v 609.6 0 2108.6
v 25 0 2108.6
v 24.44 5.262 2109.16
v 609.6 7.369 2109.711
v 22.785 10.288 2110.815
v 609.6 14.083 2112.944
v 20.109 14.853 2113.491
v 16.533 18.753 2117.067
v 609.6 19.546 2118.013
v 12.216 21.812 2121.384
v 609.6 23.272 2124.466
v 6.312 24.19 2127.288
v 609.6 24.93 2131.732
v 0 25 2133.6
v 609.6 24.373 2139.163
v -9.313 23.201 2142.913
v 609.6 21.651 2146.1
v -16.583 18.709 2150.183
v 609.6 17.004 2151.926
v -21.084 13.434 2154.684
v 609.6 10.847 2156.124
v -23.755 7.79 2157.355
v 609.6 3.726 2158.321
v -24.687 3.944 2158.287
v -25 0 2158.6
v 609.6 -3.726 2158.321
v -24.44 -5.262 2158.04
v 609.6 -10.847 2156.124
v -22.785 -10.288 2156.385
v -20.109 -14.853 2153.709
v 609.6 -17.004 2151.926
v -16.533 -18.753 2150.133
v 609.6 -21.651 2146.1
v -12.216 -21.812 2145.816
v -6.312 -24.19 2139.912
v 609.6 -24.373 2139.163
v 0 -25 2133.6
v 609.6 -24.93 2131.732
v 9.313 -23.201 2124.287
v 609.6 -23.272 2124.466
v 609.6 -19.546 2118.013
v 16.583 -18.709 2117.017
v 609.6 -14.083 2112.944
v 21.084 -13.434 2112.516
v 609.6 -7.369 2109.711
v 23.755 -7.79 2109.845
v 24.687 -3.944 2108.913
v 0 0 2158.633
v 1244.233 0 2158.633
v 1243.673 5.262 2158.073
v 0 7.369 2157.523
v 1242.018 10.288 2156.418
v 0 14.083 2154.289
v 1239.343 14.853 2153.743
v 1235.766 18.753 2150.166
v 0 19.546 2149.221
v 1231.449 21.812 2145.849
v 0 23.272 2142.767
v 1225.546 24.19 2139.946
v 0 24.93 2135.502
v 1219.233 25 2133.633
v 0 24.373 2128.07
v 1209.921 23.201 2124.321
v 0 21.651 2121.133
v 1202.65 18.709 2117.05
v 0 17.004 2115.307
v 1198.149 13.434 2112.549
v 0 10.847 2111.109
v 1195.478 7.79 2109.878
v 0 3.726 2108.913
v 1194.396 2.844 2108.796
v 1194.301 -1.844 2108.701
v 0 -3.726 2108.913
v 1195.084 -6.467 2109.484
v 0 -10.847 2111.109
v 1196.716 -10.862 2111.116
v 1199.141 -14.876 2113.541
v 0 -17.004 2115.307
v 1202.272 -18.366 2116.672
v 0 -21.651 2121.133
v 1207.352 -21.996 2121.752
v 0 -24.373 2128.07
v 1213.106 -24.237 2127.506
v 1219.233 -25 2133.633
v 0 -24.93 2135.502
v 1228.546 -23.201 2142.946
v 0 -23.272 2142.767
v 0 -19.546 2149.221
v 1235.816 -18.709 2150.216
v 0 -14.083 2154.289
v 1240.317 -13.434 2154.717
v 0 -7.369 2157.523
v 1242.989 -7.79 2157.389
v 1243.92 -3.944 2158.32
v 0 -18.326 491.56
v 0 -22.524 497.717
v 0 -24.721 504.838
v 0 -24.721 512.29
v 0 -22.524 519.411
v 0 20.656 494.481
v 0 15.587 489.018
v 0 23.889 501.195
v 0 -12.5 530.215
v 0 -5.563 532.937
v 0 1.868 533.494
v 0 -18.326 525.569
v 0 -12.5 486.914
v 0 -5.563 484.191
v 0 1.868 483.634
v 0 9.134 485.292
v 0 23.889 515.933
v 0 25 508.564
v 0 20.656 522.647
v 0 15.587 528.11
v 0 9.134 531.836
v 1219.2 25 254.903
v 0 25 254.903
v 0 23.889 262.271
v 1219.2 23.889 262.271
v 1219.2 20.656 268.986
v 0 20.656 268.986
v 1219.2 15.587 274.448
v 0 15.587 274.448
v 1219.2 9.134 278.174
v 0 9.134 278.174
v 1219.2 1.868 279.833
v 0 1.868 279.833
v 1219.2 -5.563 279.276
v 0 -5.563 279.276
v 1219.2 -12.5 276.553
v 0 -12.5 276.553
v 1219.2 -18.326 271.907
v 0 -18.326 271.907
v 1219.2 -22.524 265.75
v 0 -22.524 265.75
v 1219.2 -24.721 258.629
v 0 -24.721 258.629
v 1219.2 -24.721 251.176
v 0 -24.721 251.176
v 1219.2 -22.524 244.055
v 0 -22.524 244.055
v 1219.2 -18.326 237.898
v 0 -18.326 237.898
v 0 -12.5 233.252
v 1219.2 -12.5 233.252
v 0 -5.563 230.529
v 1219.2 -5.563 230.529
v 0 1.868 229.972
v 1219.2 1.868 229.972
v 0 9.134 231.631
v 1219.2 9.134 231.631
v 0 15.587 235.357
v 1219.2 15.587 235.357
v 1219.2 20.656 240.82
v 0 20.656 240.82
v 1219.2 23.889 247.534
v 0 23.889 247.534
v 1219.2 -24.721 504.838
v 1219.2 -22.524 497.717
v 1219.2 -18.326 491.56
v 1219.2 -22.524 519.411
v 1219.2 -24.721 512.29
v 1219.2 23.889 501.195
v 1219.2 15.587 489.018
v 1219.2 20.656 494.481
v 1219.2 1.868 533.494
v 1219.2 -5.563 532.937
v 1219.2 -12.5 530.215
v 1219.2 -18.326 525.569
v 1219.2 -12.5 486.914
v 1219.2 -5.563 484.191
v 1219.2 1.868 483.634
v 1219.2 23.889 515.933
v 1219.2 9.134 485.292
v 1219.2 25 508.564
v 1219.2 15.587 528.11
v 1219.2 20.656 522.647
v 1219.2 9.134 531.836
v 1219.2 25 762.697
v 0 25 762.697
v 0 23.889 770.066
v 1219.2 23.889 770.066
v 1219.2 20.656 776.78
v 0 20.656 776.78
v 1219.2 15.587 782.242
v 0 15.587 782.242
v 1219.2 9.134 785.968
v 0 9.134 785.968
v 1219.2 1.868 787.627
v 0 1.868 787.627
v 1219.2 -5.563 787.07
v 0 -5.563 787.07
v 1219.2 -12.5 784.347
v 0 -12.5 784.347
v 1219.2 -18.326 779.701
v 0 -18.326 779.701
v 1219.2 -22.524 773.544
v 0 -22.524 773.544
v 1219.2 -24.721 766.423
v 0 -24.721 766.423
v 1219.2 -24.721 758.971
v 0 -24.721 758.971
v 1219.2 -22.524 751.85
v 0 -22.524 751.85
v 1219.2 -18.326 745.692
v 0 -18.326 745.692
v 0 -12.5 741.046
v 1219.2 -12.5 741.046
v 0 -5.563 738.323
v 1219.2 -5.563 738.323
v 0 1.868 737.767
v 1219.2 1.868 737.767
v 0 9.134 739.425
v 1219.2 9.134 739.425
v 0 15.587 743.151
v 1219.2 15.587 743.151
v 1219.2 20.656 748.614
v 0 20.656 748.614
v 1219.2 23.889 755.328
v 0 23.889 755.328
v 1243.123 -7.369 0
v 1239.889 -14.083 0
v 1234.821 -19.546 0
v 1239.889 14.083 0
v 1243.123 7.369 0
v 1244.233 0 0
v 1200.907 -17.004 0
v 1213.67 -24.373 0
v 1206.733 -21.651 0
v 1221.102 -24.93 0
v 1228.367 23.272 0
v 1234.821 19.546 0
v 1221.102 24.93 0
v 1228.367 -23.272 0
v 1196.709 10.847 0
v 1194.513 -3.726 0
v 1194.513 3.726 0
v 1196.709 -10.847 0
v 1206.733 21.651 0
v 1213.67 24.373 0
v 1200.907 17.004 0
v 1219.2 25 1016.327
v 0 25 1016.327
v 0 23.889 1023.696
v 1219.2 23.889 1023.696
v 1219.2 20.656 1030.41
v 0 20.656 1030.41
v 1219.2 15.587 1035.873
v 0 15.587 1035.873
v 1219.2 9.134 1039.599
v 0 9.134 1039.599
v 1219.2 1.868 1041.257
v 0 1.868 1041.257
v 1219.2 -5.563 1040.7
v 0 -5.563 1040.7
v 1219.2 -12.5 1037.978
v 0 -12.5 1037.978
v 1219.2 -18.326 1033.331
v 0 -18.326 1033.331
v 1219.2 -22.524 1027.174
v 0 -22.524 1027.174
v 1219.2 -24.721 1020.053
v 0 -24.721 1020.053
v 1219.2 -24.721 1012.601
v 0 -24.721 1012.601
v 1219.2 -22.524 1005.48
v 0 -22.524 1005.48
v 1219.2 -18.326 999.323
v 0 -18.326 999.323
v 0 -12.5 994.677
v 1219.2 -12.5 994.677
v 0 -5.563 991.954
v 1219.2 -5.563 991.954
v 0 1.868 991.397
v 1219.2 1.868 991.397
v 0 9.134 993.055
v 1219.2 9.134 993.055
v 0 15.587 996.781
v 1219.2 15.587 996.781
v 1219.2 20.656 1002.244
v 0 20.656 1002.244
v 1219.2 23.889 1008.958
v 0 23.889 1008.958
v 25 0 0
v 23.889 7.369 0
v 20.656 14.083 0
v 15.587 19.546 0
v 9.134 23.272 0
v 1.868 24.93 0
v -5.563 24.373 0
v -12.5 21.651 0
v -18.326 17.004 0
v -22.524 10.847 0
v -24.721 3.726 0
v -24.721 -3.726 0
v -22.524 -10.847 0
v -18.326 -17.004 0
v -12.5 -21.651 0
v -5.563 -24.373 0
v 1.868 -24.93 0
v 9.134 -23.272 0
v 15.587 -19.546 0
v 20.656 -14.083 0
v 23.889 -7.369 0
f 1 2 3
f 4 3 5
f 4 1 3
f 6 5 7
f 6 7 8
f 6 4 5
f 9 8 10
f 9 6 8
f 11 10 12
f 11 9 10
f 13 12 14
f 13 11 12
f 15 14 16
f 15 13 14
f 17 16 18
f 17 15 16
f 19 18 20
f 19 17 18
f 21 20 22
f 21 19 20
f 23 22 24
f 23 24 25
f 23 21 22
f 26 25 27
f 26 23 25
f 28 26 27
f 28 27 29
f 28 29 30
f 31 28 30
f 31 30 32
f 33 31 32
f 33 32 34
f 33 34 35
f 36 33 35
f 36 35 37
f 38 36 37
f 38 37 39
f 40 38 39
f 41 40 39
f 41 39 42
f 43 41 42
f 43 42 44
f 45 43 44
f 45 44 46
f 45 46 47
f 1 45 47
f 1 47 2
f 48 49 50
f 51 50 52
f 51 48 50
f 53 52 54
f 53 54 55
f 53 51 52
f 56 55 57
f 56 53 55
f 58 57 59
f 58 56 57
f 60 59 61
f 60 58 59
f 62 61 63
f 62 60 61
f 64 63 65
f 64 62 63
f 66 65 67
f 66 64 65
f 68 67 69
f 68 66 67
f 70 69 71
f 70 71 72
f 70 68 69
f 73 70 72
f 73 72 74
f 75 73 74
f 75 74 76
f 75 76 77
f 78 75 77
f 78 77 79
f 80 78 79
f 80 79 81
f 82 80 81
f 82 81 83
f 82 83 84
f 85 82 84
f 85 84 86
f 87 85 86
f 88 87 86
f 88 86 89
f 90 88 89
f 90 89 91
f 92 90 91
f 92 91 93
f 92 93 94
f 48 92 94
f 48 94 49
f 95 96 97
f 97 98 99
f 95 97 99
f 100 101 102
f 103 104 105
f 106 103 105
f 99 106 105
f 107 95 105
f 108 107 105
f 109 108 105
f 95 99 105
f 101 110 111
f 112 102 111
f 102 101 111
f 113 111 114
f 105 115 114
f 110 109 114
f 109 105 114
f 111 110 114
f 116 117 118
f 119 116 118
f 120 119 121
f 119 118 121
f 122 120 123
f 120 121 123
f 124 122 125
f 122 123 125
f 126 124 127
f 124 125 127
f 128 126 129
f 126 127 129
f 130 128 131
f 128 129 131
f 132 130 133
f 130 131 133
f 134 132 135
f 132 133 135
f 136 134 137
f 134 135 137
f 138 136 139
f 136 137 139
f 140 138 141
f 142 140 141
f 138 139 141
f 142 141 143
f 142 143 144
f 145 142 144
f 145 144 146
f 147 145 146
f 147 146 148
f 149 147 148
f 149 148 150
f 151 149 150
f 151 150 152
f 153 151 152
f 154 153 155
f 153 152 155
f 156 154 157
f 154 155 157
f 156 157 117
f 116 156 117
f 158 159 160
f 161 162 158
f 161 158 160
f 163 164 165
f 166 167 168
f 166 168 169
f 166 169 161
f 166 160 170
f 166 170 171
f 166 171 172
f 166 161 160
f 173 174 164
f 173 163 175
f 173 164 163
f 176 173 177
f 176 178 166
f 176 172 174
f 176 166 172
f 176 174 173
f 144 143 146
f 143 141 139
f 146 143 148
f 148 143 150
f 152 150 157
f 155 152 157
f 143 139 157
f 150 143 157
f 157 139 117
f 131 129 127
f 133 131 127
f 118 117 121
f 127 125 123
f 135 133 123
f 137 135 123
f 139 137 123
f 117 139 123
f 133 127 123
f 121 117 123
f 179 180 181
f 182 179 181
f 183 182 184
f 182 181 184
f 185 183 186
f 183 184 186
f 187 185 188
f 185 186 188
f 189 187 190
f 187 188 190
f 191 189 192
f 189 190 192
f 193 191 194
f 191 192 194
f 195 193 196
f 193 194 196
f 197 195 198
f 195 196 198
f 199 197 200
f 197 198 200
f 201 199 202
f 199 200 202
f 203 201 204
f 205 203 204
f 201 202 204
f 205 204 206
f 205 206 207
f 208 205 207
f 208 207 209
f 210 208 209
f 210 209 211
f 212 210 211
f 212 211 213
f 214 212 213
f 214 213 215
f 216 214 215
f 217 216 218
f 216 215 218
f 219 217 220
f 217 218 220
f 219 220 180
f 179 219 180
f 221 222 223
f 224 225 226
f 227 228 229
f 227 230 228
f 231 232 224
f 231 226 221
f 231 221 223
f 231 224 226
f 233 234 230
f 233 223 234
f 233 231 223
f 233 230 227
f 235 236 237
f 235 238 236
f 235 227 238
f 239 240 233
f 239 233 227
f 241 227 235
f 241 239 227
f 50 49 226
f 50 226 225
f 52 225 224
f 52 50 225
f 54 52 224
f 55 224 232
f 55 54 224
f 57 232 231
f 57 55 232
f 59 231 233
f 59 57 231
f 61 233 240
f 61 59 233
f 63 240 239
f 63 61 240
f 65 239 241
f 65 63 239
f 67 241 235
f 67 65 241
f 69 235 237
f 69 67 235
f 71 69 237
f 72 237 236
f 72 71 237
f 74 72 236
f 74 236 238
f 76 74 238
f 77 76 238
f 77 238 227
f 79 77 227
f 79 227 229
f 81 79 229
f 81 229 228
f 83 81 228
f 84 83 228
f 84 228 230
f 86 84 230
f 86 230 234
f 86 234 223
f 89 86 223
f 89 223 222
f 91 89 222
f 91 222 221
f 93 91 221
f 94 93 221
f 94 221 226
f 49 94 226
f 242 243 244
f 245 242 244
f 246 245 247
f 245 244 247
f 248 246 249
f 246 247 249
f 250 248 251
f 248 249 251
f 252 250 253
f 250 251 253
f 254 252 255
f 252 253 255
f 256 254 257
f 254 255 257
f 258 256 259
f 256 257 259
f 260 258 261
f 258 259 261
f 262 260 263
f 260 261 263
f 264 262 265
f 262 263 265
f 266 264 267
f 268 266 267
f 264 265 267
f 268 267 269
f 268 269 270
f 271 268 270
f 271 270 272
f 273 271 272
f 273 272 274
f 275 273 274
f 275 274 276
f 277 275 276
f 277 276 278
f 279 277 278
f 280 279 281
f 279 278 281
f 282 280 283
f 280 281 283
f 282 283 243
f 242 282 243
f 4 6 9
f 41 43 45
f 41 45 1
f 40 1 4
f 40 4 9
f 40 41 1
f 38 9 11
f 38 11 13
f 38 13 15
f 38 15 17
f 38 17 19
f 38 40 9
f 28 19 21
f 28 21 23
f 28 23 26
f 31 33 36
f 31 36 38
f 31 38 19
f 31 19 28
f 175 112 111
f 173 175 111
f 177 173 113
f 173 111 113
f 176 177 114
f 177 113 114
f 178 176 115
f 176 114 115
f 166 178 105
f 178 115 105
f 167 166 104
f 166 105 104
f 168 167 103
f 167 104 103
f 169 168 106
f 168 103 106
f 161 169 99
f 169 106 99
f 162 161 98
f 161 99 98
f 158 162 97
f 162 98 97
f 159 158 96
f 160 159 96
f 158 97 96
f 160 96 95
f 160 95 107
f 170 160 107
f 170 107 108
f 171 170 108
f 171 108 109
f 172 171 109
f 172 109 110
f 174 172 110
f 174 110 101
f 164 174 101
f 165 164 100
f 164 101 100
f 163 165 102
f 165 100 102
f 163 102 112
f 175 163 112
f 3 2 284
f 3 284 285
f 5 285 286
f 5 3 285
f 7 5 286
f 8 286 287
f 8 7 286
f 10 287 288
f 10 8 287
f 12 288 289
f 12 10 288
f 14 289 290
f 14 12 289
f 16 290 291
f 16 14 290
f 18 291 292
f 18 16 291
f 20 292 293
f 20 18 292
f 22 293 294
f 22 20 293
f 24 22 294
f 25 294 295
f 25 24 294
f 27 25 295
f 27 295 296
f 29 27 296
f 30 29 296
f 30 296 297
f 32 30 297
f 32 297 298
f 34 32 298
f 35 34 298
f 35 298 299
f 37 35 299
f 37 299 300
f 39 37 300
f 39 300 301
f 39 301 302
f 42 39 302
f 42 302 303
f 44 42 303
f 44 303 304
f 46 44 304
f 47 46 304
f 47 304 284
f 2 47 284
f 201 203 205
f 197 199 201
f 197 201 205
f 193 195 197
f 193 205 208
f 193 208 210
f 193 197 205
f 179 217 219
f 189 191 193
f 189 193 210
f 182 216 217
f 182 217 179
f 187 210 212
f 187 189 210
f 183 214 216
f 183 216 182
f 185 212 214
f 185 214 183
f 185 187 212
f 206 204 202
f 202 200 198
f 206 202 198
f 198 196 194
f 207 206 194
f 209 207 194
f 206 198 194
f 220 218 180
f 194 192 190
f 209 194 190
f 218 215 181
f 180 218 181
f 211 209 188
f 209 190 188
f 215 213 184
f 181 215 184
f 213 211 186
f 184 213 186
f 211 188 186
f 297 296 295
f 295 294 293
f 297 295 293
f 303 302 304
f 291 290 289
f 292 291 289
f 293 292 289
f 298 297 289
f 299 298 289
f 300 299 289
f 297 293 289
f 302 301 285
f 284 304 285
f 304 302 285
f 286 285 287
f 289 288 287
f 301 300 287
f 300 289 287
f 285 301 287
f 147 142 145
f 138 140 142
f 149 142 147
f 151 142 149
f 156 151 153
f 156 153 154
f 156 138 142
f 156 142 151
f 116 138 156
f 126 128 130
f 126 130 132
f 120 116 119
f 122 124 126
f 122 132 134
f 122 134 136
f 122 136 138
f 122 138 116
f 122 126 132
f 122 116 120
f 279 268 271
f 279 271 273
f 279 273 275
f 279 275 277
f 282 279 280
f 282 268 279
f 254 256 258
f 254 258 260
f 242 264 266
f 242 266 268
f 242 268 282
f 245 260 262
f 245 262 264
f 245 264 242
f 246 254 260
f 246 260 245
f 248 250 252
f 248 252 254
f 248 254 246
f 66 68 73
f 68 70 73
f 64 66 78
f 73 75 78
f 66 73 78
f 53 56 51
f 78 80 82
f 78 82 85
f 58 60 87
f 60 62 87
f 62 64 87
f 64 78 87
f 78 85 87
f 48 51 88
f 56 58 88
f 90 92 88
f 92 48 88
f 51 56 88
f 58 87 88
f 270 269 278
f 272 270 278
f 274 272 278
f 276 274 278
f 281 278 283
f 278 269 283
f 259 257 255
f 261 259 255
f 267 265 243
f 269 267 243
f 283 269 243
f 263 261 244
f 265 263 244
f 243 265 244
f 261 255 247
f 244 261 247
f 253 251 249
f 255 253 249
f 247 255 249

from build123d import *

# Parameters (mm, degrees)
F0_R     = 25
F4_R     = 25
F7_R     = 25
F8_DEPTH = 1219.2


with BuildPart() as f2:
    # F2: sweep along a path in F1
    with BuildLine(Plane.XZ) as f2_path:
        Line((0, 0), (0, 2133.6))
        Line((0, 2133.6), (609.6, 2133.6))
    # F0 (on Top) → F2 (sweep)
    with BuildSketch(Plane.XY):
        Circle(F0_R)
    sweep(path=f2_path.line, transition=Transition.RIGHT)


with BuildPart() as f5:
    # F5: sweep along a path in F1
    with BuildLine(Plane.XZ) as f5_path:
        Line((1219.2, 0), (1219.2, 2133.6))
        Line((1219.2, 2133.6), (0, 2133.6))
    # F4 (on line) → F5 (sweep)
    with BuildSketch(Plane(origin=(0, 0, 0), x_dir=(1, 0, 0), z_dir=(0, 0, -1))):
        with Locations((1219.2332744598, 0)):
            Circle(F4_R)
    sweep(path=f5_path.line, transition=Transition.RIGHT)


with BuildPart() as f8:
    # F7 (on line) → F8 (new body)
    with BuildSketch(Plane.YZ):
        with Locations((0, 1016.3271427155)):
            Circle(F7_R)
    extrude(amount=F8_DEPTH)


with BuildPart() as f8b:
    # F7 (on line) → F8, piece 2 (new body)
    with BuildSketch(Plane.YZ):
        with Locations((0, 762.6966238022)):
            Circle(F7_R)
    extrude(amount=F8_DEPTH)


with BuildPart() as f8c:
    # F7 (on line) → F8, piece 3 (new body)
    with BuildSketch(Plane.YZ):
        with Locations((0, 508.5642337799)):
            Circle(F7_R)
    extrude(amount=F8_DEPTH)


with BuildPart() as f8d:
    # F7 (on line) → F8, piece 4 (new body)
    with BuildSketch(Plane.YZ):
        with Locations((0, 254.9025118351)):
            Circle(F7_R)
    extrude(amount=F8_DEPTH)


solid = Compound([f2.part, f5.part, f8.part, f8b.part, f8c.part, f8d.part])
